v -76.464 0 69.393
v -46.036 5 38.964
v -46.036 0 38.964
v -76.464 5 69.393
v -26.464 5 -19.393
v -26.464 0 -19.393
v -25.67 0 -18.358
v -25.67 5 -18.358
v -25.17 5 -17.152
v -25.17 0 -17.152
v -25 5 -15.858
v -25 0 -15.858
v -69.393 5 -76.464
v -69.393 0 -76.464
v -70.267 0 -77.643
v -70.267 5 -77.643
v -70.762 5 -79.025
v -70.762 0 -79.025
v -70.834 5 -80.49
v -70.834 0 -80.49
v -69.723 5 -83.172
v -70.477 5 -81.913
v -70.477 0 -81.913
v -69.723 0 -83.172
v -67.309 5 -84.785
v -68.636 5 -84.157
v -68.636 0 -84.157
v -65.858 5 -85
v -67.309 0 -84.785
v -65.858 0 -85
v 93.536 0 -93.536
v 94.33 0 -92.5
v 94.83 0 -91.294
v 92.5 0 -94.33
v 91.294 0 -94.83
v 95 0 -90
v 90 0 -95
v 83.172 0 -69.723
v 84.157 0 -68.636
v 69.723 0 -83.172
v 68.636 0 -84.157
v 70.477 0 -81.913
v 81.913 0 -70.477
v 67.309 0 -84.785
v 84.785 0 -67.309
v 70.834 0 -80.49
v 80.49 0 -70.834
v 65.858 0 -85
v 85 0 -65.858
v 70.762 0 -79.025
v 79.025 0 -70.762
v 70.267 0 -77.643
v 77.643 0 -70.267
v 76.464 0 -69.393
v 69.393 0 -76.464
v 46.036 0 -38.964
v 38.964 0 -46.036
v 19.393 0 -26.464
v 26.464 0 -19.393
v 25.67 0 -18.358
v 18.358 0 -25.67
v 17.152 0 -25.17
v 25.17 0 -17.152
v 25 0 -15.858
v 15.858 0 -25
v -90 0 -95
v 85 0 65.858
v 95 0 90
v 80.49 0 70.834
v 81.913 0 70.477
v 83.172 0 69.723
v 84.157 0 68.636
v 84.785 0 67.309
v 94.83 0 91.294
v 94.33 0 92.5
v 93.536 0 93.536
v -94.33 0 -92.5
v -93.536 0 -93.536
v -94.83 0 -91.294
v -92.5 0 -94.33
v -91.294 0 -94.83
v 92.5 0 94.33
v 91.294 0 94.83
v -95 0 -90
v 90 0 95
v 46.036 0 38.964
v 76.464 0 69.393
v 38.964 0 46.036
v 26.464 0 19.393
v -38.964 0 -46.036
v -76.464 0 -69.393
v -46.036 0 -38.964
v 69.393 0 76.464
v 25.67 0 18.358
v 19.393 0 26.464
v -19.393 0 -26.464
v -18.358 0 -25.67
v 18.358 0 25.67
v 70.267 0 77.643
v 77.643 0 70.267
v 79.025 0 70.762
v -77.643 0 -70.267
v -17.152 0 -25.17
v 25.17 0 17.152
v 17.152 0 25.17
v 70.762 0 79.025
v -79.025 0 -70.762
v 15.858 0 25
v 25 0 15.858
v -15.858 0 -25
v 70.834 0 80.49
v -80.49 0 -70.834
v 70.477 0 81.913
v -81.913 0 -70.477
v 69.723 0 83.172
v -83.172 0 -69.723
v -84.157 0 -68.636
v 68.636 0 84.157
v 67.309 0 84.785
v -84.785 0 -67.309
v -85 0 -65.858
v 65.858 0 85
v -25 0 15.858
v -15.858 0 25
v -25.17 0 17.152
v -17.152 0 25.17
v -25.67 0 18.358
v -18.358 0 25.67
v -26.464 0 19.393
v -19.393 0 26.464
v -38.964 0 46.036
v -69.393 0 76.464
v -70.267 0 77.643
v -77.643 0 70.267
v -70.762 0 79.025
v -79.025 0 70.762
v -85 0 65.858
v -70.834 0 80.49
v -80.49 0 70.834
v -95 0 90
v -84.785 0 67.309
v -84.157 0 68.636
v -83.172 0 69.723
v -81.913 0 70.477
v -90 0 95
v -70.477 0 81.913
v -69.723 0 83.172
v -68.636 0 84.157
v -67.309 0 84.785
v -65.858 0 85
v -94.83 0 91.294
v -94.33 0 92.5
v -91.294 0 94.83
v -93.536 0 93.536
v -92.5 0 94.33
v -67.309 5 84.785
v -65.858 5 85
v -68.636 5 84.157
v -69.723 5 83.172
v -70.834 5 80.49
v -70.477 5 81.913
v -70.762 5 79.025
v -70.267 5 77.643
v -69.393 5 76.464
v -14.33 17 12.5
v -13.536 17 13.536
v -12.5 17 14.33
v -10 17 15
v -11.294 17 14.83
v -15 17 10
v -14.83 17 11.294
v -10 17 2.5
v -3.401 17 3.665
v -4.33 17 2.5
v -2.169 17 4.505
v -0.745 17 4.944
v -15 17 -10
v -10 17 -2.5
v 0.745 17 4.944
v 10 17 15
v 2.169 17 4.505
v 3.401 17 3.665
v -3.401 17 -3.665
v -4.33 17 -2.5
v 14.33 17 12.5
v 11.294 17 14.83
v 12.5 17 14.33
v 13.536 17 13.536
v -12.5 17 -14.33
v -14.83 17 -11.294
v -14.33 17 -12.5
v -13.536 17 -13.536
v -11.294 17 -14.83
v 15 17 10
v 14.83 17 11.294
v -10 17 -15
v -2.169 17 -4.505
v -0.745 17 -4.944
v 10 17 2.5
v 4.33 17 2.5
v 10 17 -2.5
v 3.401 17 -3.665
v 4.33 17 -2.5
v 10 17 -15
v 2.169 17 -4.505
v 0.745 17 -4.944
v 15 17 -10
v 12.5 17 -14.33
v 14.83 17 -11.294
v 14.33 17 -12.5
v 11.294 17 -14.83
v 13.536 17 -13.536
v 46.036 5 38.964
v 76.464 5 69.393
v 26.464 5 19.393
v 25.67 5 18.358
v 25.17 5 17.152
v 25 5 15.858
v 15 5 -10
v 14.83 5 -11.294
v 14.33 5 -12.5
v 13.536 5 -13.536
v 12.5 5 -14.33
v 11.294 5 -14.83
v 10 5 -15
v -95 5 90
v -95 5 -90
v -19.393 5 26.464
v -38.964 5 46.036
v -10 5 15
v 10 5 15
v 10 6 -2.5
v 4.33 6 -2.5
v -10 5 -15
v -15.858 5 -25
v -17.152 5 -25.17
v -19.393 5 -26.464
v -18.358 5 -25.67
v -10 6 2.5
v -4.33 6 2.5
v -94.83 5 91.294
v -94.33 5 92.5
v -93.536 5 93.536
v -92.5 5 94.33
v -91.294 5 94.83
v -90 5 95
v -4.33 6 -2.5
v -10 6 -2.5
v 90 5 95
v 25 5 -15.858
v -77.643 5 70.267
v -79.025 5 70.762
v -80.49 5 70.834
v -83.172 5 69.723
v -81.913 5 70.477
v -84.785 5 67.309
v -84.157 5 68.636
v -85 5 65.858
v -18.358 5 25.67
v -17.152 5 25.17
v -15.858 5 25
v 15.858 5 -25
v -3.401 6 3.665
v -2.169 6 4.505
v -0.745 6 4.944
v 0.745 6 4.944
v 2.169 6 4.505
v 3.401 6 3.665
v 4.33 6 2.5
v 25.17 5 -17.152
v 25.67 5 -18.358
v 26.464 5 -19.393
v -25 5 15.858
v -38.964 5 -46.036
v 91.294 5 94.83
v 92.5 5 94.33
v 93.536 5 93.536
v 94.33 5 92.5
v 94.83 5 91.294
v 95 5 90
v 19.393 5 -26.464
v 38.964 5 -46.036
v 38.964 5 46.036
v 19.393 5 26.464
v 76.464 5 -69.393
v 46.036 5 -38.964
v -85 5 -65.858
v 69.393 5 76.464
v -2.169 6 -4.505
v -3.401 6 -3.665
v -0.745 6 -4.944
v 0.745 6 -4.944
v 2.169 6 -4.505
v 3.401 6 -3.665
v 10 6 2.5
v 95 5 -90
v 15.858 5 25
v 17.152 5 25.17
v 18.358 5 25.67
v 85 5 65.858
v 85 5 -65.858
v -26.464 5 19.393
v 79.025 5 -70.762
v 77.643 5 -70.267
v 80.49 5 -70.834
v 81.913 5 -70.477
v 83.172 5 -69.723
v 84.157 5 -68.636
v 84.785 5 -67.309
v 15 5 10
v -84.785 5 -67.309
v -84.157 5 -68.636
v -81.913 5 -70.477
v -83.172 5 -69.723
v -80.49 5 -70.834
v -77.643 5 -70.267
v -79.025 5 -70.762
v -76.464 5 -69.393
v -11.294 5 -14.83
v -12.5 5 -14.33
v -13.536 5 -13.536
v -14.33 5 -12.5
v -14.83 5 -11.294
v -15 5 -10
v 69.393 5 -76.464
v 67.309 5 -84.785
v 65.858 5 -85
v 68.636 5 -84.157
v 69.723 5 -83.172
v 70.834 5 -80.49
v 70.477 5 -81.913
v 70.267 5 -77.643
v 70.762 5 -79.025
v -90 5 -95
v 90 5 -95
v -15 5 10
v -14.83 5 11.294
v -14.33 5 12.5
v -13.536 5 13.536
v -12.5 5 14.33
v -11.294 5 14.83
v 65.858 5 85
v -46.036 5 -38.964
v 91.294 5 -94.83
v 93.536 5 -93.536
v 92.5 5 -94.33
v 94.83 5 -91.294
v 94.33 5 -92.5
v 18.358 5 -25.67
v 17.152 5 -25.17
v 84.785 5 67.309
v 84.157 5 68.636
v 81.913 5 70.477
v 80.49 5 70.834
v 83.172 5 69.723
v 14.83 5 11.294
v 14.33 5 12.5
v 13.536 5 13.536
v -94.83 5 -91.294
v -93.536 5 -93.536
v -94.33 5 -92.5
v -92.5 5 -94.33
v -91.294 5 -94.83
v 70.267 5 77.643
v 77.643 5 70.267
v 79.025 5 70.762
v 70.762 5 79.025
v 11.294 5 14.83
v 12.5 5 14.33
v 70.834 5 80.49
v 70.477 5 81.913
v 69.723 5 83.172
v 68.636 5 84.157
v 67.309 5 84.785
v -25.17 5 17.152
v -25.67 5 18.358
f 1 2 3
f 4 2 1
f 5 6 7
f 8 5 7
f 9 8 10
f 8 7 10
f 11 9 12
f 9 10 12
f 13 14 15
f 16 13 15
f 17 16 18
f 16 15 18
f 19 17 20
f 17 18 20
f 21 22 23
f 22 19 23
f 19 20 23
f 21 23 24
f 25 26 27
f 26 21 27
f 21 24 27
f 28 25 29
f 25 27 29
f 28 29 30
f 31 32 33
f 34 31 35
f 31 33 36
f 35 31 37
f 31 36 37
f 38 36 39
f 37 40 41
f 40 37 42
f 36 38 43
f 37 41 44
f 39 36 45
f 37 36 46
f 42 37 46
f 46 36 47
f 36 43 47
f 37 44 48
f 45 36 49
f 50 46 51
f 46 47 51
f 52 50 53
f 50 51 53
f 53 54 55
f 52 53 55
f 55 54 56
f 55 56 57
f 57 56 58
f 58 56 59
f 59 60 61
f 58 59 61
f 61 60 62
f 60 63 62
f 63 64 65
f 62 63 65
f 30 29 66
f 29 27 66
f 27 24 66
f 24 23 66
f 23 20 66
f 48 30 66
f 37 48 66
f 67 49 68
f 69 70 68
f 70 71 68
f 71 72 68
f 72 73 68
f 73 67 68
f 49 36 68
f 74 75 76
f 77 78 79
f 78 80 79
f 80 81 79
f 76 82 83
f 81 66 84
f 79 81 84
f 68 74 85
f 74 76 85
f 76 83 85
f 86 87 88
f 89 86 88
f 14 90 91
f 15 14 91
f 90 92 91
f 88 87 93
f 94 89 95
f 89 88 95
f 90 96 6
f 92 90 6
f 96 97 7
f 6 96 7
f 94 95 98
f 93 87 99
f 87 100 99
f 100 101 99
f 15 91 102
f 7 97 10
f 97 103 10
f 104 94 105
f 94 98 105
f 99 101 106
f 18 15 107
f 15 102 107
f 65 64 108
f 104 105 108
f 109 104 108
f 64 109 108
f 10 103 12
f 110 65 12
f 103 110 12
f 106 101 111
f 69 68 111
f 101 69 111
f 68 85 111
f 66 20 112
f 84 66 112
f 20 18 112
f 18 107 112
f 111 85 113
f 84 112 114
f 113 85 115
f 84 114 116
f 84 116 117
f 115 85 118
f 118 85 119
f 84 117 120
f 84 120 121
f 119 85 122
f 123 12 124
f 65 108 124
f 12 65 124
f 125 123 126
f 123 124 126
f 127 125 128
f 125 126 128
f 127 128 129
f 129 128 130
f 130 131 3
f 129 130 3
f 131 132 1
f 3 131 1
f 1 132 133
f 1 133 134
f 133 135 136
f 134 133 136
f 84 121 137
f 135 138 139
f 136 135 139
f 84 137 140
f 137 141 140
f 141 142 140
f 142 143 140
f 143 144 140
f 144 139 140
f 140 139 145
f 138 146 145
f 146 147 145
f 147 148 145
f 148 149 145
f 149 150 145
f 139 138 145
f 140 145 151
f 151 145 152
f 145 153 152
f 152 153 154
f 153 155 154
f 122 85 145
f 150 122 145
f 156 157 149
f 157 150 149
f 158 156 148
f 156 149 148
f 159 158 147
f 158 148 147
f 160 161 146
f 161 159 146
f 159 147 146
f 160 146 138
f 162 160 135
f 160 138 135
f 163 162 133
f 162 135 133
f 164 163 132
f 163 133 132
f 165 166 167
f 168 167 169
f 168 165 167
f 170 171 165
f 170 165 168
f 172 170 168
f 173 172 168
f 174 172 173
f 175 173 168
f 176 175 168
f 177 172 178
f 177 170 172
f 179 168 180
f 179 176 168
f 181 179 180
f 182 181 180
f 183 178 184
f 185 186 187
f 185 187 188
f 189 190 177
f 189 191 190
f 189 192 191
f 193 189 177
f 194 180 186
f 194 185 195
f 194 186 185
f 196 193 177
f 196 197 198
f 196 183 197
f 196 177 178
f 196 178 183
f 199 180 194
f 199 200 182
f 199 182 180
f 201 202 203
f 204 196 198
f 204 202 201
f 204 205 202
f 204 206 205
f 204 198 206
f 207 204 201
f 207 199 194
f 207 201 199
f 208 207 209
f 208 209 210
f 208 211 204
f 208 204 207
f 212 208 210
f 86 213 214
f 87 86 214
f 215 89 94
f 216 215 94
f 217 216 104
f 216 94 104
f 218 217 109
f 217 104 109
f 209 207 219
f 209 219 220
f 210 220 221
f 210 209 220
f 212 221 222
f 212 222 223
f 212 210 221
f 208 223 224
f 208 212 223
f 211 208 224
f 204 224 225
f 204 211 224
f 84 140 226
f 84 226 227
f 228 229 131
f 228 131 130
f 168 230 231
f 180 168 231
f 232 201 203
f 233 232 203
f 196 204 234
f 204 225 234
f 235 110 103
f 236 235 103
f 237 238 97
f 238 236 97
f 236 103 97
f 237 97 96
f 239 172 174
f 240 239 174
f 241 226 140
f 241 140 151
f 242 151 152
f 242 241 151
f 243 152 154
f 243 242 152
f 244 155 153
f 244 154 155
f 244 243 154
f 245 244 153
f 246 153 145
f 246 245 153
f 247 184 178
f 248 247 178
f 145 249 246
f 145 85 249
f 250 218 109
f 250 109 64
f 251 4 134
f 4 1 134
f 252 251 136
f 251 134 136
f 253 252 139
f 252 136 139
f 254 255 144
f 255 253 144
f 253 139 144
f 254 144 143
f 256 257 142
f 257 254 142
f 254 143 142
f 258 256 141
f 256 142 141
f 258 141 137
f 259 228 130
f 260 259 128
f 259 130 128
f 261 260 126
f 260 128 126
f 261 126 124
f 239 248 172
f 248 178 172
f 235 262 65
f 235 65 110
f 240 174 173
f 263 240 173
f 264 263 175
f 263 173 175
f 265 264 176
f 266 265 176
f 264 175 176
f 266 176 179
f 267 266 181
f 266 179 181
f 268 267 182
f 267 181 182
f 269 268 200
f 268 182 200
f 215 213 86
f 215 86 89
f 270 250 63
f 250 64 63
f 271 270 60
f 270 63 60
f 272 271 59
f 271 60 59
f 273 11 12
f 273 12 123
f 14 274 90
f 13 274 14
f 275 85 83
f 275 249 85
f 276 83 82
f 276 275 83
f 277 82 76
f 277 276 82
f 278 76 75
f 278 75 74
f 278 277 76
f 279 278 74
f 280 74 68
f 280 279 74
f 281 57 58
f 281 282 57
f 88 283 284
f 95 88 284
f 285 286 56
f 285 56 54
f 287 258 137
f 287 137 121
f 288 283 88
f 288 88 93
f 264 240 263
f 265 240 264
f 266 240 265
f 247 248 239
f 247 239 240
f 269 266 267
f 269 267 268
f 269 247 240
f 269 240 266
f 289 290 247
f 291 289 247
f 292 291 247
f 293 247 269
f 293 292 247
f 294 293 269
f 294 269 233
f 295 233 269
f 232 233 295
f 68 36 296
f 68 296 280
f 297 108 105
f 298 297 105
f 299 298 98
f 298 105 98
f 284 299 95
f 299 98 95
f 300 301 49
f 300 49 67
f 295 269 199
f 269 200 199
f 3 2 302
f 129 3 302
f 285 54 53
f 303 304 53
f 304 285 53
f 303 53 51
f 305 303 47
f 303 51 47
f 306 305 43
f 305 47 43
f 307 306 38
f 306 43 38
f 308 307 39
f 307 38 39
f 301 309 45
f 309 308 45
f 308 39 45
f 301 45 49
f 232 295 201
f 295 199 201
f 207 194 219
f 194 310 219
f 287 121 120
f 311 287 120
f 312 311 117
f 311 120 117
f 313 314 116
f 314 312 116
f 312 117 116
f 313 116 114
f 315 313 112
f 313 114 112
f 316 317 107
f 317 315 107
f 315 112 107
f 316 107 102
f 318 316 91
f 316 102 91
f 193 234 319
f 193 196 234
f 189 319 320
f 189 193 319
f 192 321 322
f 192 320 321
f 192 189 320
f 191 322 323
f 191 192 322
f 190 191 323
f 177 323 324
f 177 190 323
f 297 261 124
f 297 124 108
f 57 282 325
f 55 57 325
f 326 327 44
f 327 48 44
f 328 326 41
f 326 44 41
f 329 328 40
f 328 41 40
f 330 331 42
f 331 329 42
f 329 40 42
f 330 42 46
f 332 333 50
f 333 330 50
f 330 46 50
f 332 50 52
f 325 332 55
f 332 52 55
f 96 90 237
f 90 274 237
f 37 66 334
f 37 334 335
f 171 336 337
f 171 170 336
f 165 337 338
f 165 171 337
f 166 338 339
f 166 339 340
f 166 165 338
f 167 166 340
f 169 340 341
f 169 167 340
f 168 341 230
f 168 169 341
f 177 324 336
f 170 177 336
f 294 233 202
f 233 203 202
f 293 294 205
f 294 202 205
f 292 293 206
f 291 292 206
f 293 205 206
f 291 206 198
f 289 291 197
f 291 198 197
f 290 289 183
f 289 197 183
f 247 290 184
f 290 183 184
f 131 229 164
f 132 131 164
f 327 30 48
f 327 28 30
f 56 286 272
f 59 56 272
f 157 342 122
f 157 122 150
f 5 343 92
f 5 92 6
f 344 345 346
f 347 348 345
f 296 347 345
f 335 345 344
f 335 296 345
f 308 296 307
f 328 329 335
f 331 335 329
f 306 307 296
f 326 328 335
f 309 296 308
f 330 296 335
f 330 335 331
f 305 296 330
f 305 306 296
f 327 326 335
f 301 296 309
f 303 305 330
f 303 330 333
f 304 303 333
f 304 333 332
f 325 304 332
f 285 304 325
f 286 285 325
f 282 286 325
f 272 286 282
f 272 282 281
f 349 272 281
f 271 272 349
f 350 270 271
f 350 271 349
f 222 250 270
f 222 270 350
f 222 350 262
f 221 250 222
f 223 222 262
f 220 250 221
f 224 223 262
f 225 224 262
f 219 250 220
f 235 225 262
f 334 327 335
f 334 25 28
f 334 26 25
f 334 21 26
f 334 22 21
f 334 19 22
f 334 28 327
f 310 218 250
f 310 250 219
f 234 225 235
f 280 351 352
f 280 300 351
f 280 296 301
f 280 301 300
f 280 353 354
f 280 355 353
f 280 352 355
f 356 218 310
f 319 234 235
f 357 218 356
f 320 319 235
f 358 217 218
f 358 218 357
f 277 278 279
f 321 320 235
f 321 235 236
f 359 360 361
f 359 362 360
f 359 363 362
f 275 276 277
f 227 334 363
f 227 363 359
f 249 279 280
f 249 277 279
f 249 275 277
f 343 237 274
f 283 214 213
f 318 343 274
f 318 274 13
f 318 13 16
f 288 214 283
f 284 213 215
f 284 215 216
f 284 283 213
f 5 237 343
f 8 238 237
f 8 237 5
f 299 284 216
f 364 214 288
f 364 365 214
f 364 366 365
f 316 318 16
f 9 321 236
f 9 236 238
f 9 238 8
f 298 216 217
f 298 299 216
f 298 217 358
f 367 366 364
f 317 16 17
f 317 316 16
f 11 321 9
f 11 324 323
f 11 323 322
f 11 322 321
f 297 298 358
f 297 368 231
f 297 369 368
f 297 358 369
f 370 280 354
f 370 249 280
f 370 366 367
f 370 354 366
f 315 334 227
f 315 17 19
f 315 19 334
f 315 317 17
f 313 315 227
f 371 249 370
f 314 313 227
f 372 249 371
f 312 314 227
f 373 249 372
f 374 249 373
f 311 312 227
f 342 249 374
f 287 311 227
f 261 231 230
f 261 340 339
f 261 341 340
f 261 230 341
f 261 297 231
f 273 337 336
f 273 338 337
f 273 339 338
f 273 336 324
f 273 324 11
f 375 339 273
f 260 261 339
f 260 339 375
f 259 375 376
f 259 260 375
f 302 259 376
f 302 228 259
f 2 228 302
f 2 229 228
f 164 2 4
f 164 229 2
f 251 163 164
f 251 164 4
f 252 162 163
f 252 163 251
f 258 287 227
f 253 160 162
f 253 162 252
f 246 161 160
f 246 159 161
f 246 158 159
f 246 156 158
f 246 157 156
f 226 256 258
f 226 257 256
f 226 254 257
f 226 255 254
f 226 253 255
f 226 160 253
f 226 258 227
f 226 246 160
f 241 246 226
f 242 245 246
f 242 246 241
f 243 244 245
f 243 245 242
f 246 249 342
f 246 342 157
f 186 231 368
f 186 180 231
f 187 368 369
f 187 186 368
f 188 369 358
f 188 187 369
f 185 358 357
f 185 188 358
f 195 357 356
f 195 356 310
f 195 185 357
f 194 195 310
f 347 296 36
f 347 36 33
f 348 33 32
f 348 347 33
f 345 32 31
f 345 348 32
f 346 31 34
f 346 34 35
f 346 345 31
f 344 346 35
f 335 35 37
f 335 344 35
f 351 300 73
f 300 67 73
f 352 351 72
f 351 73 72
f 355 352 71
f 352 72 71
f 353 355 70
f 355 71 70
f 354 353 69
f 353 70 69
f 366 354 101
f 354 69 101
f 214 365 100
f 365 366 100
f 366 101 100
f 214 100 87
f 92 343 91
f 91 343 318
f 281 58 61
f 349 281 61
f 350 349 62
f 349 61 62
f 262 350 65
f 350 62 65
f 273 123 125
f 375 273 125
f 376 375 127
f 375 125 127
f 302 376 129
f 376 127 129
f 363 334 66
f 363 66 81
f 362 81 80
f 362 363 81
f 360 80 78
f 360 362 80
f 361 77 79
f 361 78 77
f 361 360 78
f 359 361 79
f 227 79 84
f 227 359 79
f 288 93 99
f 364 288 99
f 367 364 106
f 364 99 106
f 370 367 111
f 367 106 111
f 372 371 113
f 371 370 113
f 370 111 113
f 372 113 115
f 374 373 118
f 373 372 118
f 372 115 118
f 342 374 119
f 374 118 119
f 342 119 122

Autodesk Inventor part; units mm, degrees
ref_plane "YZ Plane" through (0, 0, 0) normal (1, 0, 0) x (0, 1, 0)
ref_plane "XZ Plane" through (0, 0, 0) normal (0, 1, 0) x (-1, 0, 0)
ref_plane "XY Plane" through (0, 0, 0) normal (0, 0, 1) x (1, 0, 0)
sketch "Sketch1" plane through (0, 0, 0) normal (0, 1, 0) x (-1, 0, 0)
  line L0 (-95, 95) -> (95, 95)
  line L1 (95, 95) -> (95, -95)
  line L2 (95, -95) -> (-95, -95)
  line L3 (-95, -95) -> (-95, 95)
  line L4 (-95, 95) -> (95, -95) construction
  line L5 (95, 95) -> (-95, -95) construction
  point P0 (0, 0)
  dimension "d0" = 190
  dimension "d1" = 190
extrude "Extrusion1" add sketch "Sketch1" along normal blind 5
sketch "Sketch2" plane through (0, 5, 0) normal (0, 1, 0) x (1, 0, 0)
  line L0 (-15, -15) -> (15, -15)
  line L1 (15, -15) -> (15, 15)
  line L2 (15, 15) -> (-15, 15)
  line L3 (-15, 15) -> (-15, -15)
  line L4 (-15, -15) -> (15, 15) construction
  line L5 (15, -15) -> (-15, 15) construction
  point P0 (0, 0)
  dimension "d4" = 30
  dimension "d5" = 30
extrude "Extrusion2" add sketch "Sketch2" along normal blind 12
sketch "Sketch3" plane through (0, 17, 0) normal (0, 1, 0) x (1, 0, 0)
  line L0 (-10, -2.5) -> (-4.3301, -2.5)
  line L1 (10, -2.5) -> (10, 2.5)
  line L2 (10, 2.5) -> (4.3301, 2.5)
  line L3 (-10, 2.5) -> (-10, -2.5)
  line L4 (-10, -2.5) -> (10, 2.5) construction
  line L5 (10, -2.5) -> (-10, 2.5) construction
  arc A0 (-4.3301, -2.5) -> (4.3301, -2.5) centre (0, 0) ccw
  arc A1 (4.3301, 2.5) -> (-4.3301, 2.5) centre (0, 0) ccw
  line L6 (4.3301, -2.5) -> (10, -2.5)
  line L7 (-4.3301, 2.5) -> (-10, 2.5)
  dimension "d9" = 20
  dimension "d10" = 5
extrude "Extrusion3" cut sketch "Sketch3" against normal blind 11
fillet "Fillet1" radius 5 4 edges at (-95, 2.5, 95) (-95, 2.5, -95) (95, 2.5, 95) (95, 2.5, -95)
fillet "Fillet2" radius 5 4 edges at (-15, 11, 15) (15, 11, 15) (15, 11, -15) (-15, 11, -15)
sketch "Sketch5" plane through (0, 5, 0) normal (0, 1, 0) x (1, 0, 0)
  line L0 (-15, -10) -> (-15, 10) projected
  arc A0 (-10, 15) -> (-15, 10) centre (-10, 10) ccw projected
  line L1 (-10, 15) -> (10, 15) projected
  arc A1 (15, 10) -> (10, 15) centre (10, 10) ccw projected
  line L2 (15, 10) -> (15, -10) projected
  arc A2 (10, -15) -> (15, -10) centre (10, -10) ccw projected
  line L3 (10, -15) -> (-10, -15) projected
  arc A3 (-15, -10) -> (-10, -15) centre (-10, -10) ccw projected
  arc A4 (95, 90) -> (90, 95) centre (90, 90) ccw projected
  line L4 (90, 95) -> (-90, 95) projected
  arc A5 (-90, 95) -> (-95, 90) centre (-90, 90) ccw projected
  line L5 (-95, 90) -> (-95, -90) projected
  arc A6 (-95, -90) -> (-90, -95) centre (-90, -90) ccw projected
  line L6 (-90, -95) -> (90, -95) projected
  arc A7 (90, -95) -> (95, -90) centre (90, -90) ccw projected
  line L7 (95, -90) -> (95, 90) projected
  arc A8 (15, 10) -> (10, 15) centre (10, 10) ccw projected
  line L8 (38.9645, 46.0355) -> (17.9289, 25)
  line L9 (38.9645, 46.0355) -> (77.9289, 85)
  line L10 (-38.9645, 46.0355) -> (-17.9289, 25)
  line L11 (-38.9645, 46.0355) -> (-77.9289, 85)
  line L12 (-77.9289, 85) -> (77.9289, 85)
  line L13 (17.9289, 25) -> (-17.9289, 25)
  line L14 (-4.3301, -2.5) -> (-10, -2.5) projected
  arc A9 (-4.3301, -2.5) -> (4.3301, -2.5) centre (0, 0) ccw projected
  line L15 (10, -2.5) -> (4.3301, -2.5) projected
  line L16 (10, 2.5) -> (10, -2.5) projected
  line L17 (4.3301, 2.5) -> (10, 2.5) projected
  arc A10 (4.3301, 2.5) -> (-4.3301, 2.5) centre (0, 0) ccw projected
  line L18 (-10, 2.5) -> (-4.3301, 2.5) projected
  line L19 (-10, -2.5) -> (-10, 2.5) projected
  line L20 (-4.3301, -2.5) -> (-10, -2.5) projected
  arc A11 (-4.3301, -2.5) -> (4.3301, -2.5) centre (0, 0) ccw projected
  line L21 (10, -2.5) -> (4.3301, -2.5) projected
  line L22 (10, 2.5) -> (10, -2.5) projected
  line L23 (4.3301, 2.5) -> (10, 2.5) projected
  arc A12 (4.3301, 2.5) -> (-4.3301, 2.5) centre (0, 0) ccw projected
  line L24 (-10, 2.5) -> (-4.3301, 2.5) projected
  line L25 (-10, -2.5) -> (-10, 2.5) projected
  arc A13 (4.3301, 2.5) -> (-4.3301, 2.5) centre (0, 0) ccw projected
  arc A14 (-4.3301, -2.5) -> (4.3301, -2.5) centre (0, 0) ccw projected
  line L26 (25, -17.9289) -> (25, 17.9289)
  line L27 (85, 77.9289) -> (85, -77.9289)
  line L28 (46.0355, -38.9645) -> (25, -17.9289)
  line L29 (46.0355, -38.9645) -> (85, -77.9289)
  line L30 (46.0355, 38.9645) -> (85, 77.9289)
  line L31 (46.0355, 38.9645) -> (25, 17.9289)
  line L32 (-17.9289, -25) -> (17.9289, -25)
  line L33 (77.9289, -85) -> (-77.9289, -85)
  line L34 (-38.9645, -46.0355) -> (-17.9289, -25)
  line L35 (-38.9645, -46.0355) -> (-77.9289, -85)
  line L36 (38.9645, -46.0355) -> (77.9289, -85)
  line L37 (38.9645, -46.0355) -> (17.9289, -25)
  line L38 (-25, 17.9289) -> (-25, -17.9289)
  line L39 (-85, -77.9289) -> (-85, 77.9289)
  line L40 (-46.0355, 38.9645) -> (-25, 17.9289)
  line L41 (-46.0355, 38.9645) -> (-85, 77.9289)
  line L42 (-46.0355, -38.9645) -> (-85, -77.9289)
  line L43 (-46.0355, -38.9645) -> (-25, -17.9289)
  dimension "d24" = 360
extrude "Extrusion4" cut sketch "Sketch5" against normal blind 32.75 contours L8 L13 L10 L11 L12 L9 | L26 L31 L30 L27 L29 L28 | L32 L37 L36 L33 L35 L34 | L38 L43 L42 L39 L41 L40
fillet "Fillet3" radius 5 16 edges at (85, 2.5, -77.9289) (77.9289, 2.5, -85) (-85, 2.5, -77.9289) (-77.9289, 2.5, -85) (-17.9289, 2.5, -25) (17.9289, 2.5, -25) (-25, 2.5, -17.9289) (-17.9289, 2.5, 25) (17.9289, 2.5, 25) (85, 2.5, 77.9289) (77.9289, 2.5, 85) (-77.9289, 2.5, 85) (-85, 2.5, 77.9289) (-25, 2.5, 17.9289) (25, 2.5, 17.9289) (25, 2.5, -17.9289)
properties part number "Base"
